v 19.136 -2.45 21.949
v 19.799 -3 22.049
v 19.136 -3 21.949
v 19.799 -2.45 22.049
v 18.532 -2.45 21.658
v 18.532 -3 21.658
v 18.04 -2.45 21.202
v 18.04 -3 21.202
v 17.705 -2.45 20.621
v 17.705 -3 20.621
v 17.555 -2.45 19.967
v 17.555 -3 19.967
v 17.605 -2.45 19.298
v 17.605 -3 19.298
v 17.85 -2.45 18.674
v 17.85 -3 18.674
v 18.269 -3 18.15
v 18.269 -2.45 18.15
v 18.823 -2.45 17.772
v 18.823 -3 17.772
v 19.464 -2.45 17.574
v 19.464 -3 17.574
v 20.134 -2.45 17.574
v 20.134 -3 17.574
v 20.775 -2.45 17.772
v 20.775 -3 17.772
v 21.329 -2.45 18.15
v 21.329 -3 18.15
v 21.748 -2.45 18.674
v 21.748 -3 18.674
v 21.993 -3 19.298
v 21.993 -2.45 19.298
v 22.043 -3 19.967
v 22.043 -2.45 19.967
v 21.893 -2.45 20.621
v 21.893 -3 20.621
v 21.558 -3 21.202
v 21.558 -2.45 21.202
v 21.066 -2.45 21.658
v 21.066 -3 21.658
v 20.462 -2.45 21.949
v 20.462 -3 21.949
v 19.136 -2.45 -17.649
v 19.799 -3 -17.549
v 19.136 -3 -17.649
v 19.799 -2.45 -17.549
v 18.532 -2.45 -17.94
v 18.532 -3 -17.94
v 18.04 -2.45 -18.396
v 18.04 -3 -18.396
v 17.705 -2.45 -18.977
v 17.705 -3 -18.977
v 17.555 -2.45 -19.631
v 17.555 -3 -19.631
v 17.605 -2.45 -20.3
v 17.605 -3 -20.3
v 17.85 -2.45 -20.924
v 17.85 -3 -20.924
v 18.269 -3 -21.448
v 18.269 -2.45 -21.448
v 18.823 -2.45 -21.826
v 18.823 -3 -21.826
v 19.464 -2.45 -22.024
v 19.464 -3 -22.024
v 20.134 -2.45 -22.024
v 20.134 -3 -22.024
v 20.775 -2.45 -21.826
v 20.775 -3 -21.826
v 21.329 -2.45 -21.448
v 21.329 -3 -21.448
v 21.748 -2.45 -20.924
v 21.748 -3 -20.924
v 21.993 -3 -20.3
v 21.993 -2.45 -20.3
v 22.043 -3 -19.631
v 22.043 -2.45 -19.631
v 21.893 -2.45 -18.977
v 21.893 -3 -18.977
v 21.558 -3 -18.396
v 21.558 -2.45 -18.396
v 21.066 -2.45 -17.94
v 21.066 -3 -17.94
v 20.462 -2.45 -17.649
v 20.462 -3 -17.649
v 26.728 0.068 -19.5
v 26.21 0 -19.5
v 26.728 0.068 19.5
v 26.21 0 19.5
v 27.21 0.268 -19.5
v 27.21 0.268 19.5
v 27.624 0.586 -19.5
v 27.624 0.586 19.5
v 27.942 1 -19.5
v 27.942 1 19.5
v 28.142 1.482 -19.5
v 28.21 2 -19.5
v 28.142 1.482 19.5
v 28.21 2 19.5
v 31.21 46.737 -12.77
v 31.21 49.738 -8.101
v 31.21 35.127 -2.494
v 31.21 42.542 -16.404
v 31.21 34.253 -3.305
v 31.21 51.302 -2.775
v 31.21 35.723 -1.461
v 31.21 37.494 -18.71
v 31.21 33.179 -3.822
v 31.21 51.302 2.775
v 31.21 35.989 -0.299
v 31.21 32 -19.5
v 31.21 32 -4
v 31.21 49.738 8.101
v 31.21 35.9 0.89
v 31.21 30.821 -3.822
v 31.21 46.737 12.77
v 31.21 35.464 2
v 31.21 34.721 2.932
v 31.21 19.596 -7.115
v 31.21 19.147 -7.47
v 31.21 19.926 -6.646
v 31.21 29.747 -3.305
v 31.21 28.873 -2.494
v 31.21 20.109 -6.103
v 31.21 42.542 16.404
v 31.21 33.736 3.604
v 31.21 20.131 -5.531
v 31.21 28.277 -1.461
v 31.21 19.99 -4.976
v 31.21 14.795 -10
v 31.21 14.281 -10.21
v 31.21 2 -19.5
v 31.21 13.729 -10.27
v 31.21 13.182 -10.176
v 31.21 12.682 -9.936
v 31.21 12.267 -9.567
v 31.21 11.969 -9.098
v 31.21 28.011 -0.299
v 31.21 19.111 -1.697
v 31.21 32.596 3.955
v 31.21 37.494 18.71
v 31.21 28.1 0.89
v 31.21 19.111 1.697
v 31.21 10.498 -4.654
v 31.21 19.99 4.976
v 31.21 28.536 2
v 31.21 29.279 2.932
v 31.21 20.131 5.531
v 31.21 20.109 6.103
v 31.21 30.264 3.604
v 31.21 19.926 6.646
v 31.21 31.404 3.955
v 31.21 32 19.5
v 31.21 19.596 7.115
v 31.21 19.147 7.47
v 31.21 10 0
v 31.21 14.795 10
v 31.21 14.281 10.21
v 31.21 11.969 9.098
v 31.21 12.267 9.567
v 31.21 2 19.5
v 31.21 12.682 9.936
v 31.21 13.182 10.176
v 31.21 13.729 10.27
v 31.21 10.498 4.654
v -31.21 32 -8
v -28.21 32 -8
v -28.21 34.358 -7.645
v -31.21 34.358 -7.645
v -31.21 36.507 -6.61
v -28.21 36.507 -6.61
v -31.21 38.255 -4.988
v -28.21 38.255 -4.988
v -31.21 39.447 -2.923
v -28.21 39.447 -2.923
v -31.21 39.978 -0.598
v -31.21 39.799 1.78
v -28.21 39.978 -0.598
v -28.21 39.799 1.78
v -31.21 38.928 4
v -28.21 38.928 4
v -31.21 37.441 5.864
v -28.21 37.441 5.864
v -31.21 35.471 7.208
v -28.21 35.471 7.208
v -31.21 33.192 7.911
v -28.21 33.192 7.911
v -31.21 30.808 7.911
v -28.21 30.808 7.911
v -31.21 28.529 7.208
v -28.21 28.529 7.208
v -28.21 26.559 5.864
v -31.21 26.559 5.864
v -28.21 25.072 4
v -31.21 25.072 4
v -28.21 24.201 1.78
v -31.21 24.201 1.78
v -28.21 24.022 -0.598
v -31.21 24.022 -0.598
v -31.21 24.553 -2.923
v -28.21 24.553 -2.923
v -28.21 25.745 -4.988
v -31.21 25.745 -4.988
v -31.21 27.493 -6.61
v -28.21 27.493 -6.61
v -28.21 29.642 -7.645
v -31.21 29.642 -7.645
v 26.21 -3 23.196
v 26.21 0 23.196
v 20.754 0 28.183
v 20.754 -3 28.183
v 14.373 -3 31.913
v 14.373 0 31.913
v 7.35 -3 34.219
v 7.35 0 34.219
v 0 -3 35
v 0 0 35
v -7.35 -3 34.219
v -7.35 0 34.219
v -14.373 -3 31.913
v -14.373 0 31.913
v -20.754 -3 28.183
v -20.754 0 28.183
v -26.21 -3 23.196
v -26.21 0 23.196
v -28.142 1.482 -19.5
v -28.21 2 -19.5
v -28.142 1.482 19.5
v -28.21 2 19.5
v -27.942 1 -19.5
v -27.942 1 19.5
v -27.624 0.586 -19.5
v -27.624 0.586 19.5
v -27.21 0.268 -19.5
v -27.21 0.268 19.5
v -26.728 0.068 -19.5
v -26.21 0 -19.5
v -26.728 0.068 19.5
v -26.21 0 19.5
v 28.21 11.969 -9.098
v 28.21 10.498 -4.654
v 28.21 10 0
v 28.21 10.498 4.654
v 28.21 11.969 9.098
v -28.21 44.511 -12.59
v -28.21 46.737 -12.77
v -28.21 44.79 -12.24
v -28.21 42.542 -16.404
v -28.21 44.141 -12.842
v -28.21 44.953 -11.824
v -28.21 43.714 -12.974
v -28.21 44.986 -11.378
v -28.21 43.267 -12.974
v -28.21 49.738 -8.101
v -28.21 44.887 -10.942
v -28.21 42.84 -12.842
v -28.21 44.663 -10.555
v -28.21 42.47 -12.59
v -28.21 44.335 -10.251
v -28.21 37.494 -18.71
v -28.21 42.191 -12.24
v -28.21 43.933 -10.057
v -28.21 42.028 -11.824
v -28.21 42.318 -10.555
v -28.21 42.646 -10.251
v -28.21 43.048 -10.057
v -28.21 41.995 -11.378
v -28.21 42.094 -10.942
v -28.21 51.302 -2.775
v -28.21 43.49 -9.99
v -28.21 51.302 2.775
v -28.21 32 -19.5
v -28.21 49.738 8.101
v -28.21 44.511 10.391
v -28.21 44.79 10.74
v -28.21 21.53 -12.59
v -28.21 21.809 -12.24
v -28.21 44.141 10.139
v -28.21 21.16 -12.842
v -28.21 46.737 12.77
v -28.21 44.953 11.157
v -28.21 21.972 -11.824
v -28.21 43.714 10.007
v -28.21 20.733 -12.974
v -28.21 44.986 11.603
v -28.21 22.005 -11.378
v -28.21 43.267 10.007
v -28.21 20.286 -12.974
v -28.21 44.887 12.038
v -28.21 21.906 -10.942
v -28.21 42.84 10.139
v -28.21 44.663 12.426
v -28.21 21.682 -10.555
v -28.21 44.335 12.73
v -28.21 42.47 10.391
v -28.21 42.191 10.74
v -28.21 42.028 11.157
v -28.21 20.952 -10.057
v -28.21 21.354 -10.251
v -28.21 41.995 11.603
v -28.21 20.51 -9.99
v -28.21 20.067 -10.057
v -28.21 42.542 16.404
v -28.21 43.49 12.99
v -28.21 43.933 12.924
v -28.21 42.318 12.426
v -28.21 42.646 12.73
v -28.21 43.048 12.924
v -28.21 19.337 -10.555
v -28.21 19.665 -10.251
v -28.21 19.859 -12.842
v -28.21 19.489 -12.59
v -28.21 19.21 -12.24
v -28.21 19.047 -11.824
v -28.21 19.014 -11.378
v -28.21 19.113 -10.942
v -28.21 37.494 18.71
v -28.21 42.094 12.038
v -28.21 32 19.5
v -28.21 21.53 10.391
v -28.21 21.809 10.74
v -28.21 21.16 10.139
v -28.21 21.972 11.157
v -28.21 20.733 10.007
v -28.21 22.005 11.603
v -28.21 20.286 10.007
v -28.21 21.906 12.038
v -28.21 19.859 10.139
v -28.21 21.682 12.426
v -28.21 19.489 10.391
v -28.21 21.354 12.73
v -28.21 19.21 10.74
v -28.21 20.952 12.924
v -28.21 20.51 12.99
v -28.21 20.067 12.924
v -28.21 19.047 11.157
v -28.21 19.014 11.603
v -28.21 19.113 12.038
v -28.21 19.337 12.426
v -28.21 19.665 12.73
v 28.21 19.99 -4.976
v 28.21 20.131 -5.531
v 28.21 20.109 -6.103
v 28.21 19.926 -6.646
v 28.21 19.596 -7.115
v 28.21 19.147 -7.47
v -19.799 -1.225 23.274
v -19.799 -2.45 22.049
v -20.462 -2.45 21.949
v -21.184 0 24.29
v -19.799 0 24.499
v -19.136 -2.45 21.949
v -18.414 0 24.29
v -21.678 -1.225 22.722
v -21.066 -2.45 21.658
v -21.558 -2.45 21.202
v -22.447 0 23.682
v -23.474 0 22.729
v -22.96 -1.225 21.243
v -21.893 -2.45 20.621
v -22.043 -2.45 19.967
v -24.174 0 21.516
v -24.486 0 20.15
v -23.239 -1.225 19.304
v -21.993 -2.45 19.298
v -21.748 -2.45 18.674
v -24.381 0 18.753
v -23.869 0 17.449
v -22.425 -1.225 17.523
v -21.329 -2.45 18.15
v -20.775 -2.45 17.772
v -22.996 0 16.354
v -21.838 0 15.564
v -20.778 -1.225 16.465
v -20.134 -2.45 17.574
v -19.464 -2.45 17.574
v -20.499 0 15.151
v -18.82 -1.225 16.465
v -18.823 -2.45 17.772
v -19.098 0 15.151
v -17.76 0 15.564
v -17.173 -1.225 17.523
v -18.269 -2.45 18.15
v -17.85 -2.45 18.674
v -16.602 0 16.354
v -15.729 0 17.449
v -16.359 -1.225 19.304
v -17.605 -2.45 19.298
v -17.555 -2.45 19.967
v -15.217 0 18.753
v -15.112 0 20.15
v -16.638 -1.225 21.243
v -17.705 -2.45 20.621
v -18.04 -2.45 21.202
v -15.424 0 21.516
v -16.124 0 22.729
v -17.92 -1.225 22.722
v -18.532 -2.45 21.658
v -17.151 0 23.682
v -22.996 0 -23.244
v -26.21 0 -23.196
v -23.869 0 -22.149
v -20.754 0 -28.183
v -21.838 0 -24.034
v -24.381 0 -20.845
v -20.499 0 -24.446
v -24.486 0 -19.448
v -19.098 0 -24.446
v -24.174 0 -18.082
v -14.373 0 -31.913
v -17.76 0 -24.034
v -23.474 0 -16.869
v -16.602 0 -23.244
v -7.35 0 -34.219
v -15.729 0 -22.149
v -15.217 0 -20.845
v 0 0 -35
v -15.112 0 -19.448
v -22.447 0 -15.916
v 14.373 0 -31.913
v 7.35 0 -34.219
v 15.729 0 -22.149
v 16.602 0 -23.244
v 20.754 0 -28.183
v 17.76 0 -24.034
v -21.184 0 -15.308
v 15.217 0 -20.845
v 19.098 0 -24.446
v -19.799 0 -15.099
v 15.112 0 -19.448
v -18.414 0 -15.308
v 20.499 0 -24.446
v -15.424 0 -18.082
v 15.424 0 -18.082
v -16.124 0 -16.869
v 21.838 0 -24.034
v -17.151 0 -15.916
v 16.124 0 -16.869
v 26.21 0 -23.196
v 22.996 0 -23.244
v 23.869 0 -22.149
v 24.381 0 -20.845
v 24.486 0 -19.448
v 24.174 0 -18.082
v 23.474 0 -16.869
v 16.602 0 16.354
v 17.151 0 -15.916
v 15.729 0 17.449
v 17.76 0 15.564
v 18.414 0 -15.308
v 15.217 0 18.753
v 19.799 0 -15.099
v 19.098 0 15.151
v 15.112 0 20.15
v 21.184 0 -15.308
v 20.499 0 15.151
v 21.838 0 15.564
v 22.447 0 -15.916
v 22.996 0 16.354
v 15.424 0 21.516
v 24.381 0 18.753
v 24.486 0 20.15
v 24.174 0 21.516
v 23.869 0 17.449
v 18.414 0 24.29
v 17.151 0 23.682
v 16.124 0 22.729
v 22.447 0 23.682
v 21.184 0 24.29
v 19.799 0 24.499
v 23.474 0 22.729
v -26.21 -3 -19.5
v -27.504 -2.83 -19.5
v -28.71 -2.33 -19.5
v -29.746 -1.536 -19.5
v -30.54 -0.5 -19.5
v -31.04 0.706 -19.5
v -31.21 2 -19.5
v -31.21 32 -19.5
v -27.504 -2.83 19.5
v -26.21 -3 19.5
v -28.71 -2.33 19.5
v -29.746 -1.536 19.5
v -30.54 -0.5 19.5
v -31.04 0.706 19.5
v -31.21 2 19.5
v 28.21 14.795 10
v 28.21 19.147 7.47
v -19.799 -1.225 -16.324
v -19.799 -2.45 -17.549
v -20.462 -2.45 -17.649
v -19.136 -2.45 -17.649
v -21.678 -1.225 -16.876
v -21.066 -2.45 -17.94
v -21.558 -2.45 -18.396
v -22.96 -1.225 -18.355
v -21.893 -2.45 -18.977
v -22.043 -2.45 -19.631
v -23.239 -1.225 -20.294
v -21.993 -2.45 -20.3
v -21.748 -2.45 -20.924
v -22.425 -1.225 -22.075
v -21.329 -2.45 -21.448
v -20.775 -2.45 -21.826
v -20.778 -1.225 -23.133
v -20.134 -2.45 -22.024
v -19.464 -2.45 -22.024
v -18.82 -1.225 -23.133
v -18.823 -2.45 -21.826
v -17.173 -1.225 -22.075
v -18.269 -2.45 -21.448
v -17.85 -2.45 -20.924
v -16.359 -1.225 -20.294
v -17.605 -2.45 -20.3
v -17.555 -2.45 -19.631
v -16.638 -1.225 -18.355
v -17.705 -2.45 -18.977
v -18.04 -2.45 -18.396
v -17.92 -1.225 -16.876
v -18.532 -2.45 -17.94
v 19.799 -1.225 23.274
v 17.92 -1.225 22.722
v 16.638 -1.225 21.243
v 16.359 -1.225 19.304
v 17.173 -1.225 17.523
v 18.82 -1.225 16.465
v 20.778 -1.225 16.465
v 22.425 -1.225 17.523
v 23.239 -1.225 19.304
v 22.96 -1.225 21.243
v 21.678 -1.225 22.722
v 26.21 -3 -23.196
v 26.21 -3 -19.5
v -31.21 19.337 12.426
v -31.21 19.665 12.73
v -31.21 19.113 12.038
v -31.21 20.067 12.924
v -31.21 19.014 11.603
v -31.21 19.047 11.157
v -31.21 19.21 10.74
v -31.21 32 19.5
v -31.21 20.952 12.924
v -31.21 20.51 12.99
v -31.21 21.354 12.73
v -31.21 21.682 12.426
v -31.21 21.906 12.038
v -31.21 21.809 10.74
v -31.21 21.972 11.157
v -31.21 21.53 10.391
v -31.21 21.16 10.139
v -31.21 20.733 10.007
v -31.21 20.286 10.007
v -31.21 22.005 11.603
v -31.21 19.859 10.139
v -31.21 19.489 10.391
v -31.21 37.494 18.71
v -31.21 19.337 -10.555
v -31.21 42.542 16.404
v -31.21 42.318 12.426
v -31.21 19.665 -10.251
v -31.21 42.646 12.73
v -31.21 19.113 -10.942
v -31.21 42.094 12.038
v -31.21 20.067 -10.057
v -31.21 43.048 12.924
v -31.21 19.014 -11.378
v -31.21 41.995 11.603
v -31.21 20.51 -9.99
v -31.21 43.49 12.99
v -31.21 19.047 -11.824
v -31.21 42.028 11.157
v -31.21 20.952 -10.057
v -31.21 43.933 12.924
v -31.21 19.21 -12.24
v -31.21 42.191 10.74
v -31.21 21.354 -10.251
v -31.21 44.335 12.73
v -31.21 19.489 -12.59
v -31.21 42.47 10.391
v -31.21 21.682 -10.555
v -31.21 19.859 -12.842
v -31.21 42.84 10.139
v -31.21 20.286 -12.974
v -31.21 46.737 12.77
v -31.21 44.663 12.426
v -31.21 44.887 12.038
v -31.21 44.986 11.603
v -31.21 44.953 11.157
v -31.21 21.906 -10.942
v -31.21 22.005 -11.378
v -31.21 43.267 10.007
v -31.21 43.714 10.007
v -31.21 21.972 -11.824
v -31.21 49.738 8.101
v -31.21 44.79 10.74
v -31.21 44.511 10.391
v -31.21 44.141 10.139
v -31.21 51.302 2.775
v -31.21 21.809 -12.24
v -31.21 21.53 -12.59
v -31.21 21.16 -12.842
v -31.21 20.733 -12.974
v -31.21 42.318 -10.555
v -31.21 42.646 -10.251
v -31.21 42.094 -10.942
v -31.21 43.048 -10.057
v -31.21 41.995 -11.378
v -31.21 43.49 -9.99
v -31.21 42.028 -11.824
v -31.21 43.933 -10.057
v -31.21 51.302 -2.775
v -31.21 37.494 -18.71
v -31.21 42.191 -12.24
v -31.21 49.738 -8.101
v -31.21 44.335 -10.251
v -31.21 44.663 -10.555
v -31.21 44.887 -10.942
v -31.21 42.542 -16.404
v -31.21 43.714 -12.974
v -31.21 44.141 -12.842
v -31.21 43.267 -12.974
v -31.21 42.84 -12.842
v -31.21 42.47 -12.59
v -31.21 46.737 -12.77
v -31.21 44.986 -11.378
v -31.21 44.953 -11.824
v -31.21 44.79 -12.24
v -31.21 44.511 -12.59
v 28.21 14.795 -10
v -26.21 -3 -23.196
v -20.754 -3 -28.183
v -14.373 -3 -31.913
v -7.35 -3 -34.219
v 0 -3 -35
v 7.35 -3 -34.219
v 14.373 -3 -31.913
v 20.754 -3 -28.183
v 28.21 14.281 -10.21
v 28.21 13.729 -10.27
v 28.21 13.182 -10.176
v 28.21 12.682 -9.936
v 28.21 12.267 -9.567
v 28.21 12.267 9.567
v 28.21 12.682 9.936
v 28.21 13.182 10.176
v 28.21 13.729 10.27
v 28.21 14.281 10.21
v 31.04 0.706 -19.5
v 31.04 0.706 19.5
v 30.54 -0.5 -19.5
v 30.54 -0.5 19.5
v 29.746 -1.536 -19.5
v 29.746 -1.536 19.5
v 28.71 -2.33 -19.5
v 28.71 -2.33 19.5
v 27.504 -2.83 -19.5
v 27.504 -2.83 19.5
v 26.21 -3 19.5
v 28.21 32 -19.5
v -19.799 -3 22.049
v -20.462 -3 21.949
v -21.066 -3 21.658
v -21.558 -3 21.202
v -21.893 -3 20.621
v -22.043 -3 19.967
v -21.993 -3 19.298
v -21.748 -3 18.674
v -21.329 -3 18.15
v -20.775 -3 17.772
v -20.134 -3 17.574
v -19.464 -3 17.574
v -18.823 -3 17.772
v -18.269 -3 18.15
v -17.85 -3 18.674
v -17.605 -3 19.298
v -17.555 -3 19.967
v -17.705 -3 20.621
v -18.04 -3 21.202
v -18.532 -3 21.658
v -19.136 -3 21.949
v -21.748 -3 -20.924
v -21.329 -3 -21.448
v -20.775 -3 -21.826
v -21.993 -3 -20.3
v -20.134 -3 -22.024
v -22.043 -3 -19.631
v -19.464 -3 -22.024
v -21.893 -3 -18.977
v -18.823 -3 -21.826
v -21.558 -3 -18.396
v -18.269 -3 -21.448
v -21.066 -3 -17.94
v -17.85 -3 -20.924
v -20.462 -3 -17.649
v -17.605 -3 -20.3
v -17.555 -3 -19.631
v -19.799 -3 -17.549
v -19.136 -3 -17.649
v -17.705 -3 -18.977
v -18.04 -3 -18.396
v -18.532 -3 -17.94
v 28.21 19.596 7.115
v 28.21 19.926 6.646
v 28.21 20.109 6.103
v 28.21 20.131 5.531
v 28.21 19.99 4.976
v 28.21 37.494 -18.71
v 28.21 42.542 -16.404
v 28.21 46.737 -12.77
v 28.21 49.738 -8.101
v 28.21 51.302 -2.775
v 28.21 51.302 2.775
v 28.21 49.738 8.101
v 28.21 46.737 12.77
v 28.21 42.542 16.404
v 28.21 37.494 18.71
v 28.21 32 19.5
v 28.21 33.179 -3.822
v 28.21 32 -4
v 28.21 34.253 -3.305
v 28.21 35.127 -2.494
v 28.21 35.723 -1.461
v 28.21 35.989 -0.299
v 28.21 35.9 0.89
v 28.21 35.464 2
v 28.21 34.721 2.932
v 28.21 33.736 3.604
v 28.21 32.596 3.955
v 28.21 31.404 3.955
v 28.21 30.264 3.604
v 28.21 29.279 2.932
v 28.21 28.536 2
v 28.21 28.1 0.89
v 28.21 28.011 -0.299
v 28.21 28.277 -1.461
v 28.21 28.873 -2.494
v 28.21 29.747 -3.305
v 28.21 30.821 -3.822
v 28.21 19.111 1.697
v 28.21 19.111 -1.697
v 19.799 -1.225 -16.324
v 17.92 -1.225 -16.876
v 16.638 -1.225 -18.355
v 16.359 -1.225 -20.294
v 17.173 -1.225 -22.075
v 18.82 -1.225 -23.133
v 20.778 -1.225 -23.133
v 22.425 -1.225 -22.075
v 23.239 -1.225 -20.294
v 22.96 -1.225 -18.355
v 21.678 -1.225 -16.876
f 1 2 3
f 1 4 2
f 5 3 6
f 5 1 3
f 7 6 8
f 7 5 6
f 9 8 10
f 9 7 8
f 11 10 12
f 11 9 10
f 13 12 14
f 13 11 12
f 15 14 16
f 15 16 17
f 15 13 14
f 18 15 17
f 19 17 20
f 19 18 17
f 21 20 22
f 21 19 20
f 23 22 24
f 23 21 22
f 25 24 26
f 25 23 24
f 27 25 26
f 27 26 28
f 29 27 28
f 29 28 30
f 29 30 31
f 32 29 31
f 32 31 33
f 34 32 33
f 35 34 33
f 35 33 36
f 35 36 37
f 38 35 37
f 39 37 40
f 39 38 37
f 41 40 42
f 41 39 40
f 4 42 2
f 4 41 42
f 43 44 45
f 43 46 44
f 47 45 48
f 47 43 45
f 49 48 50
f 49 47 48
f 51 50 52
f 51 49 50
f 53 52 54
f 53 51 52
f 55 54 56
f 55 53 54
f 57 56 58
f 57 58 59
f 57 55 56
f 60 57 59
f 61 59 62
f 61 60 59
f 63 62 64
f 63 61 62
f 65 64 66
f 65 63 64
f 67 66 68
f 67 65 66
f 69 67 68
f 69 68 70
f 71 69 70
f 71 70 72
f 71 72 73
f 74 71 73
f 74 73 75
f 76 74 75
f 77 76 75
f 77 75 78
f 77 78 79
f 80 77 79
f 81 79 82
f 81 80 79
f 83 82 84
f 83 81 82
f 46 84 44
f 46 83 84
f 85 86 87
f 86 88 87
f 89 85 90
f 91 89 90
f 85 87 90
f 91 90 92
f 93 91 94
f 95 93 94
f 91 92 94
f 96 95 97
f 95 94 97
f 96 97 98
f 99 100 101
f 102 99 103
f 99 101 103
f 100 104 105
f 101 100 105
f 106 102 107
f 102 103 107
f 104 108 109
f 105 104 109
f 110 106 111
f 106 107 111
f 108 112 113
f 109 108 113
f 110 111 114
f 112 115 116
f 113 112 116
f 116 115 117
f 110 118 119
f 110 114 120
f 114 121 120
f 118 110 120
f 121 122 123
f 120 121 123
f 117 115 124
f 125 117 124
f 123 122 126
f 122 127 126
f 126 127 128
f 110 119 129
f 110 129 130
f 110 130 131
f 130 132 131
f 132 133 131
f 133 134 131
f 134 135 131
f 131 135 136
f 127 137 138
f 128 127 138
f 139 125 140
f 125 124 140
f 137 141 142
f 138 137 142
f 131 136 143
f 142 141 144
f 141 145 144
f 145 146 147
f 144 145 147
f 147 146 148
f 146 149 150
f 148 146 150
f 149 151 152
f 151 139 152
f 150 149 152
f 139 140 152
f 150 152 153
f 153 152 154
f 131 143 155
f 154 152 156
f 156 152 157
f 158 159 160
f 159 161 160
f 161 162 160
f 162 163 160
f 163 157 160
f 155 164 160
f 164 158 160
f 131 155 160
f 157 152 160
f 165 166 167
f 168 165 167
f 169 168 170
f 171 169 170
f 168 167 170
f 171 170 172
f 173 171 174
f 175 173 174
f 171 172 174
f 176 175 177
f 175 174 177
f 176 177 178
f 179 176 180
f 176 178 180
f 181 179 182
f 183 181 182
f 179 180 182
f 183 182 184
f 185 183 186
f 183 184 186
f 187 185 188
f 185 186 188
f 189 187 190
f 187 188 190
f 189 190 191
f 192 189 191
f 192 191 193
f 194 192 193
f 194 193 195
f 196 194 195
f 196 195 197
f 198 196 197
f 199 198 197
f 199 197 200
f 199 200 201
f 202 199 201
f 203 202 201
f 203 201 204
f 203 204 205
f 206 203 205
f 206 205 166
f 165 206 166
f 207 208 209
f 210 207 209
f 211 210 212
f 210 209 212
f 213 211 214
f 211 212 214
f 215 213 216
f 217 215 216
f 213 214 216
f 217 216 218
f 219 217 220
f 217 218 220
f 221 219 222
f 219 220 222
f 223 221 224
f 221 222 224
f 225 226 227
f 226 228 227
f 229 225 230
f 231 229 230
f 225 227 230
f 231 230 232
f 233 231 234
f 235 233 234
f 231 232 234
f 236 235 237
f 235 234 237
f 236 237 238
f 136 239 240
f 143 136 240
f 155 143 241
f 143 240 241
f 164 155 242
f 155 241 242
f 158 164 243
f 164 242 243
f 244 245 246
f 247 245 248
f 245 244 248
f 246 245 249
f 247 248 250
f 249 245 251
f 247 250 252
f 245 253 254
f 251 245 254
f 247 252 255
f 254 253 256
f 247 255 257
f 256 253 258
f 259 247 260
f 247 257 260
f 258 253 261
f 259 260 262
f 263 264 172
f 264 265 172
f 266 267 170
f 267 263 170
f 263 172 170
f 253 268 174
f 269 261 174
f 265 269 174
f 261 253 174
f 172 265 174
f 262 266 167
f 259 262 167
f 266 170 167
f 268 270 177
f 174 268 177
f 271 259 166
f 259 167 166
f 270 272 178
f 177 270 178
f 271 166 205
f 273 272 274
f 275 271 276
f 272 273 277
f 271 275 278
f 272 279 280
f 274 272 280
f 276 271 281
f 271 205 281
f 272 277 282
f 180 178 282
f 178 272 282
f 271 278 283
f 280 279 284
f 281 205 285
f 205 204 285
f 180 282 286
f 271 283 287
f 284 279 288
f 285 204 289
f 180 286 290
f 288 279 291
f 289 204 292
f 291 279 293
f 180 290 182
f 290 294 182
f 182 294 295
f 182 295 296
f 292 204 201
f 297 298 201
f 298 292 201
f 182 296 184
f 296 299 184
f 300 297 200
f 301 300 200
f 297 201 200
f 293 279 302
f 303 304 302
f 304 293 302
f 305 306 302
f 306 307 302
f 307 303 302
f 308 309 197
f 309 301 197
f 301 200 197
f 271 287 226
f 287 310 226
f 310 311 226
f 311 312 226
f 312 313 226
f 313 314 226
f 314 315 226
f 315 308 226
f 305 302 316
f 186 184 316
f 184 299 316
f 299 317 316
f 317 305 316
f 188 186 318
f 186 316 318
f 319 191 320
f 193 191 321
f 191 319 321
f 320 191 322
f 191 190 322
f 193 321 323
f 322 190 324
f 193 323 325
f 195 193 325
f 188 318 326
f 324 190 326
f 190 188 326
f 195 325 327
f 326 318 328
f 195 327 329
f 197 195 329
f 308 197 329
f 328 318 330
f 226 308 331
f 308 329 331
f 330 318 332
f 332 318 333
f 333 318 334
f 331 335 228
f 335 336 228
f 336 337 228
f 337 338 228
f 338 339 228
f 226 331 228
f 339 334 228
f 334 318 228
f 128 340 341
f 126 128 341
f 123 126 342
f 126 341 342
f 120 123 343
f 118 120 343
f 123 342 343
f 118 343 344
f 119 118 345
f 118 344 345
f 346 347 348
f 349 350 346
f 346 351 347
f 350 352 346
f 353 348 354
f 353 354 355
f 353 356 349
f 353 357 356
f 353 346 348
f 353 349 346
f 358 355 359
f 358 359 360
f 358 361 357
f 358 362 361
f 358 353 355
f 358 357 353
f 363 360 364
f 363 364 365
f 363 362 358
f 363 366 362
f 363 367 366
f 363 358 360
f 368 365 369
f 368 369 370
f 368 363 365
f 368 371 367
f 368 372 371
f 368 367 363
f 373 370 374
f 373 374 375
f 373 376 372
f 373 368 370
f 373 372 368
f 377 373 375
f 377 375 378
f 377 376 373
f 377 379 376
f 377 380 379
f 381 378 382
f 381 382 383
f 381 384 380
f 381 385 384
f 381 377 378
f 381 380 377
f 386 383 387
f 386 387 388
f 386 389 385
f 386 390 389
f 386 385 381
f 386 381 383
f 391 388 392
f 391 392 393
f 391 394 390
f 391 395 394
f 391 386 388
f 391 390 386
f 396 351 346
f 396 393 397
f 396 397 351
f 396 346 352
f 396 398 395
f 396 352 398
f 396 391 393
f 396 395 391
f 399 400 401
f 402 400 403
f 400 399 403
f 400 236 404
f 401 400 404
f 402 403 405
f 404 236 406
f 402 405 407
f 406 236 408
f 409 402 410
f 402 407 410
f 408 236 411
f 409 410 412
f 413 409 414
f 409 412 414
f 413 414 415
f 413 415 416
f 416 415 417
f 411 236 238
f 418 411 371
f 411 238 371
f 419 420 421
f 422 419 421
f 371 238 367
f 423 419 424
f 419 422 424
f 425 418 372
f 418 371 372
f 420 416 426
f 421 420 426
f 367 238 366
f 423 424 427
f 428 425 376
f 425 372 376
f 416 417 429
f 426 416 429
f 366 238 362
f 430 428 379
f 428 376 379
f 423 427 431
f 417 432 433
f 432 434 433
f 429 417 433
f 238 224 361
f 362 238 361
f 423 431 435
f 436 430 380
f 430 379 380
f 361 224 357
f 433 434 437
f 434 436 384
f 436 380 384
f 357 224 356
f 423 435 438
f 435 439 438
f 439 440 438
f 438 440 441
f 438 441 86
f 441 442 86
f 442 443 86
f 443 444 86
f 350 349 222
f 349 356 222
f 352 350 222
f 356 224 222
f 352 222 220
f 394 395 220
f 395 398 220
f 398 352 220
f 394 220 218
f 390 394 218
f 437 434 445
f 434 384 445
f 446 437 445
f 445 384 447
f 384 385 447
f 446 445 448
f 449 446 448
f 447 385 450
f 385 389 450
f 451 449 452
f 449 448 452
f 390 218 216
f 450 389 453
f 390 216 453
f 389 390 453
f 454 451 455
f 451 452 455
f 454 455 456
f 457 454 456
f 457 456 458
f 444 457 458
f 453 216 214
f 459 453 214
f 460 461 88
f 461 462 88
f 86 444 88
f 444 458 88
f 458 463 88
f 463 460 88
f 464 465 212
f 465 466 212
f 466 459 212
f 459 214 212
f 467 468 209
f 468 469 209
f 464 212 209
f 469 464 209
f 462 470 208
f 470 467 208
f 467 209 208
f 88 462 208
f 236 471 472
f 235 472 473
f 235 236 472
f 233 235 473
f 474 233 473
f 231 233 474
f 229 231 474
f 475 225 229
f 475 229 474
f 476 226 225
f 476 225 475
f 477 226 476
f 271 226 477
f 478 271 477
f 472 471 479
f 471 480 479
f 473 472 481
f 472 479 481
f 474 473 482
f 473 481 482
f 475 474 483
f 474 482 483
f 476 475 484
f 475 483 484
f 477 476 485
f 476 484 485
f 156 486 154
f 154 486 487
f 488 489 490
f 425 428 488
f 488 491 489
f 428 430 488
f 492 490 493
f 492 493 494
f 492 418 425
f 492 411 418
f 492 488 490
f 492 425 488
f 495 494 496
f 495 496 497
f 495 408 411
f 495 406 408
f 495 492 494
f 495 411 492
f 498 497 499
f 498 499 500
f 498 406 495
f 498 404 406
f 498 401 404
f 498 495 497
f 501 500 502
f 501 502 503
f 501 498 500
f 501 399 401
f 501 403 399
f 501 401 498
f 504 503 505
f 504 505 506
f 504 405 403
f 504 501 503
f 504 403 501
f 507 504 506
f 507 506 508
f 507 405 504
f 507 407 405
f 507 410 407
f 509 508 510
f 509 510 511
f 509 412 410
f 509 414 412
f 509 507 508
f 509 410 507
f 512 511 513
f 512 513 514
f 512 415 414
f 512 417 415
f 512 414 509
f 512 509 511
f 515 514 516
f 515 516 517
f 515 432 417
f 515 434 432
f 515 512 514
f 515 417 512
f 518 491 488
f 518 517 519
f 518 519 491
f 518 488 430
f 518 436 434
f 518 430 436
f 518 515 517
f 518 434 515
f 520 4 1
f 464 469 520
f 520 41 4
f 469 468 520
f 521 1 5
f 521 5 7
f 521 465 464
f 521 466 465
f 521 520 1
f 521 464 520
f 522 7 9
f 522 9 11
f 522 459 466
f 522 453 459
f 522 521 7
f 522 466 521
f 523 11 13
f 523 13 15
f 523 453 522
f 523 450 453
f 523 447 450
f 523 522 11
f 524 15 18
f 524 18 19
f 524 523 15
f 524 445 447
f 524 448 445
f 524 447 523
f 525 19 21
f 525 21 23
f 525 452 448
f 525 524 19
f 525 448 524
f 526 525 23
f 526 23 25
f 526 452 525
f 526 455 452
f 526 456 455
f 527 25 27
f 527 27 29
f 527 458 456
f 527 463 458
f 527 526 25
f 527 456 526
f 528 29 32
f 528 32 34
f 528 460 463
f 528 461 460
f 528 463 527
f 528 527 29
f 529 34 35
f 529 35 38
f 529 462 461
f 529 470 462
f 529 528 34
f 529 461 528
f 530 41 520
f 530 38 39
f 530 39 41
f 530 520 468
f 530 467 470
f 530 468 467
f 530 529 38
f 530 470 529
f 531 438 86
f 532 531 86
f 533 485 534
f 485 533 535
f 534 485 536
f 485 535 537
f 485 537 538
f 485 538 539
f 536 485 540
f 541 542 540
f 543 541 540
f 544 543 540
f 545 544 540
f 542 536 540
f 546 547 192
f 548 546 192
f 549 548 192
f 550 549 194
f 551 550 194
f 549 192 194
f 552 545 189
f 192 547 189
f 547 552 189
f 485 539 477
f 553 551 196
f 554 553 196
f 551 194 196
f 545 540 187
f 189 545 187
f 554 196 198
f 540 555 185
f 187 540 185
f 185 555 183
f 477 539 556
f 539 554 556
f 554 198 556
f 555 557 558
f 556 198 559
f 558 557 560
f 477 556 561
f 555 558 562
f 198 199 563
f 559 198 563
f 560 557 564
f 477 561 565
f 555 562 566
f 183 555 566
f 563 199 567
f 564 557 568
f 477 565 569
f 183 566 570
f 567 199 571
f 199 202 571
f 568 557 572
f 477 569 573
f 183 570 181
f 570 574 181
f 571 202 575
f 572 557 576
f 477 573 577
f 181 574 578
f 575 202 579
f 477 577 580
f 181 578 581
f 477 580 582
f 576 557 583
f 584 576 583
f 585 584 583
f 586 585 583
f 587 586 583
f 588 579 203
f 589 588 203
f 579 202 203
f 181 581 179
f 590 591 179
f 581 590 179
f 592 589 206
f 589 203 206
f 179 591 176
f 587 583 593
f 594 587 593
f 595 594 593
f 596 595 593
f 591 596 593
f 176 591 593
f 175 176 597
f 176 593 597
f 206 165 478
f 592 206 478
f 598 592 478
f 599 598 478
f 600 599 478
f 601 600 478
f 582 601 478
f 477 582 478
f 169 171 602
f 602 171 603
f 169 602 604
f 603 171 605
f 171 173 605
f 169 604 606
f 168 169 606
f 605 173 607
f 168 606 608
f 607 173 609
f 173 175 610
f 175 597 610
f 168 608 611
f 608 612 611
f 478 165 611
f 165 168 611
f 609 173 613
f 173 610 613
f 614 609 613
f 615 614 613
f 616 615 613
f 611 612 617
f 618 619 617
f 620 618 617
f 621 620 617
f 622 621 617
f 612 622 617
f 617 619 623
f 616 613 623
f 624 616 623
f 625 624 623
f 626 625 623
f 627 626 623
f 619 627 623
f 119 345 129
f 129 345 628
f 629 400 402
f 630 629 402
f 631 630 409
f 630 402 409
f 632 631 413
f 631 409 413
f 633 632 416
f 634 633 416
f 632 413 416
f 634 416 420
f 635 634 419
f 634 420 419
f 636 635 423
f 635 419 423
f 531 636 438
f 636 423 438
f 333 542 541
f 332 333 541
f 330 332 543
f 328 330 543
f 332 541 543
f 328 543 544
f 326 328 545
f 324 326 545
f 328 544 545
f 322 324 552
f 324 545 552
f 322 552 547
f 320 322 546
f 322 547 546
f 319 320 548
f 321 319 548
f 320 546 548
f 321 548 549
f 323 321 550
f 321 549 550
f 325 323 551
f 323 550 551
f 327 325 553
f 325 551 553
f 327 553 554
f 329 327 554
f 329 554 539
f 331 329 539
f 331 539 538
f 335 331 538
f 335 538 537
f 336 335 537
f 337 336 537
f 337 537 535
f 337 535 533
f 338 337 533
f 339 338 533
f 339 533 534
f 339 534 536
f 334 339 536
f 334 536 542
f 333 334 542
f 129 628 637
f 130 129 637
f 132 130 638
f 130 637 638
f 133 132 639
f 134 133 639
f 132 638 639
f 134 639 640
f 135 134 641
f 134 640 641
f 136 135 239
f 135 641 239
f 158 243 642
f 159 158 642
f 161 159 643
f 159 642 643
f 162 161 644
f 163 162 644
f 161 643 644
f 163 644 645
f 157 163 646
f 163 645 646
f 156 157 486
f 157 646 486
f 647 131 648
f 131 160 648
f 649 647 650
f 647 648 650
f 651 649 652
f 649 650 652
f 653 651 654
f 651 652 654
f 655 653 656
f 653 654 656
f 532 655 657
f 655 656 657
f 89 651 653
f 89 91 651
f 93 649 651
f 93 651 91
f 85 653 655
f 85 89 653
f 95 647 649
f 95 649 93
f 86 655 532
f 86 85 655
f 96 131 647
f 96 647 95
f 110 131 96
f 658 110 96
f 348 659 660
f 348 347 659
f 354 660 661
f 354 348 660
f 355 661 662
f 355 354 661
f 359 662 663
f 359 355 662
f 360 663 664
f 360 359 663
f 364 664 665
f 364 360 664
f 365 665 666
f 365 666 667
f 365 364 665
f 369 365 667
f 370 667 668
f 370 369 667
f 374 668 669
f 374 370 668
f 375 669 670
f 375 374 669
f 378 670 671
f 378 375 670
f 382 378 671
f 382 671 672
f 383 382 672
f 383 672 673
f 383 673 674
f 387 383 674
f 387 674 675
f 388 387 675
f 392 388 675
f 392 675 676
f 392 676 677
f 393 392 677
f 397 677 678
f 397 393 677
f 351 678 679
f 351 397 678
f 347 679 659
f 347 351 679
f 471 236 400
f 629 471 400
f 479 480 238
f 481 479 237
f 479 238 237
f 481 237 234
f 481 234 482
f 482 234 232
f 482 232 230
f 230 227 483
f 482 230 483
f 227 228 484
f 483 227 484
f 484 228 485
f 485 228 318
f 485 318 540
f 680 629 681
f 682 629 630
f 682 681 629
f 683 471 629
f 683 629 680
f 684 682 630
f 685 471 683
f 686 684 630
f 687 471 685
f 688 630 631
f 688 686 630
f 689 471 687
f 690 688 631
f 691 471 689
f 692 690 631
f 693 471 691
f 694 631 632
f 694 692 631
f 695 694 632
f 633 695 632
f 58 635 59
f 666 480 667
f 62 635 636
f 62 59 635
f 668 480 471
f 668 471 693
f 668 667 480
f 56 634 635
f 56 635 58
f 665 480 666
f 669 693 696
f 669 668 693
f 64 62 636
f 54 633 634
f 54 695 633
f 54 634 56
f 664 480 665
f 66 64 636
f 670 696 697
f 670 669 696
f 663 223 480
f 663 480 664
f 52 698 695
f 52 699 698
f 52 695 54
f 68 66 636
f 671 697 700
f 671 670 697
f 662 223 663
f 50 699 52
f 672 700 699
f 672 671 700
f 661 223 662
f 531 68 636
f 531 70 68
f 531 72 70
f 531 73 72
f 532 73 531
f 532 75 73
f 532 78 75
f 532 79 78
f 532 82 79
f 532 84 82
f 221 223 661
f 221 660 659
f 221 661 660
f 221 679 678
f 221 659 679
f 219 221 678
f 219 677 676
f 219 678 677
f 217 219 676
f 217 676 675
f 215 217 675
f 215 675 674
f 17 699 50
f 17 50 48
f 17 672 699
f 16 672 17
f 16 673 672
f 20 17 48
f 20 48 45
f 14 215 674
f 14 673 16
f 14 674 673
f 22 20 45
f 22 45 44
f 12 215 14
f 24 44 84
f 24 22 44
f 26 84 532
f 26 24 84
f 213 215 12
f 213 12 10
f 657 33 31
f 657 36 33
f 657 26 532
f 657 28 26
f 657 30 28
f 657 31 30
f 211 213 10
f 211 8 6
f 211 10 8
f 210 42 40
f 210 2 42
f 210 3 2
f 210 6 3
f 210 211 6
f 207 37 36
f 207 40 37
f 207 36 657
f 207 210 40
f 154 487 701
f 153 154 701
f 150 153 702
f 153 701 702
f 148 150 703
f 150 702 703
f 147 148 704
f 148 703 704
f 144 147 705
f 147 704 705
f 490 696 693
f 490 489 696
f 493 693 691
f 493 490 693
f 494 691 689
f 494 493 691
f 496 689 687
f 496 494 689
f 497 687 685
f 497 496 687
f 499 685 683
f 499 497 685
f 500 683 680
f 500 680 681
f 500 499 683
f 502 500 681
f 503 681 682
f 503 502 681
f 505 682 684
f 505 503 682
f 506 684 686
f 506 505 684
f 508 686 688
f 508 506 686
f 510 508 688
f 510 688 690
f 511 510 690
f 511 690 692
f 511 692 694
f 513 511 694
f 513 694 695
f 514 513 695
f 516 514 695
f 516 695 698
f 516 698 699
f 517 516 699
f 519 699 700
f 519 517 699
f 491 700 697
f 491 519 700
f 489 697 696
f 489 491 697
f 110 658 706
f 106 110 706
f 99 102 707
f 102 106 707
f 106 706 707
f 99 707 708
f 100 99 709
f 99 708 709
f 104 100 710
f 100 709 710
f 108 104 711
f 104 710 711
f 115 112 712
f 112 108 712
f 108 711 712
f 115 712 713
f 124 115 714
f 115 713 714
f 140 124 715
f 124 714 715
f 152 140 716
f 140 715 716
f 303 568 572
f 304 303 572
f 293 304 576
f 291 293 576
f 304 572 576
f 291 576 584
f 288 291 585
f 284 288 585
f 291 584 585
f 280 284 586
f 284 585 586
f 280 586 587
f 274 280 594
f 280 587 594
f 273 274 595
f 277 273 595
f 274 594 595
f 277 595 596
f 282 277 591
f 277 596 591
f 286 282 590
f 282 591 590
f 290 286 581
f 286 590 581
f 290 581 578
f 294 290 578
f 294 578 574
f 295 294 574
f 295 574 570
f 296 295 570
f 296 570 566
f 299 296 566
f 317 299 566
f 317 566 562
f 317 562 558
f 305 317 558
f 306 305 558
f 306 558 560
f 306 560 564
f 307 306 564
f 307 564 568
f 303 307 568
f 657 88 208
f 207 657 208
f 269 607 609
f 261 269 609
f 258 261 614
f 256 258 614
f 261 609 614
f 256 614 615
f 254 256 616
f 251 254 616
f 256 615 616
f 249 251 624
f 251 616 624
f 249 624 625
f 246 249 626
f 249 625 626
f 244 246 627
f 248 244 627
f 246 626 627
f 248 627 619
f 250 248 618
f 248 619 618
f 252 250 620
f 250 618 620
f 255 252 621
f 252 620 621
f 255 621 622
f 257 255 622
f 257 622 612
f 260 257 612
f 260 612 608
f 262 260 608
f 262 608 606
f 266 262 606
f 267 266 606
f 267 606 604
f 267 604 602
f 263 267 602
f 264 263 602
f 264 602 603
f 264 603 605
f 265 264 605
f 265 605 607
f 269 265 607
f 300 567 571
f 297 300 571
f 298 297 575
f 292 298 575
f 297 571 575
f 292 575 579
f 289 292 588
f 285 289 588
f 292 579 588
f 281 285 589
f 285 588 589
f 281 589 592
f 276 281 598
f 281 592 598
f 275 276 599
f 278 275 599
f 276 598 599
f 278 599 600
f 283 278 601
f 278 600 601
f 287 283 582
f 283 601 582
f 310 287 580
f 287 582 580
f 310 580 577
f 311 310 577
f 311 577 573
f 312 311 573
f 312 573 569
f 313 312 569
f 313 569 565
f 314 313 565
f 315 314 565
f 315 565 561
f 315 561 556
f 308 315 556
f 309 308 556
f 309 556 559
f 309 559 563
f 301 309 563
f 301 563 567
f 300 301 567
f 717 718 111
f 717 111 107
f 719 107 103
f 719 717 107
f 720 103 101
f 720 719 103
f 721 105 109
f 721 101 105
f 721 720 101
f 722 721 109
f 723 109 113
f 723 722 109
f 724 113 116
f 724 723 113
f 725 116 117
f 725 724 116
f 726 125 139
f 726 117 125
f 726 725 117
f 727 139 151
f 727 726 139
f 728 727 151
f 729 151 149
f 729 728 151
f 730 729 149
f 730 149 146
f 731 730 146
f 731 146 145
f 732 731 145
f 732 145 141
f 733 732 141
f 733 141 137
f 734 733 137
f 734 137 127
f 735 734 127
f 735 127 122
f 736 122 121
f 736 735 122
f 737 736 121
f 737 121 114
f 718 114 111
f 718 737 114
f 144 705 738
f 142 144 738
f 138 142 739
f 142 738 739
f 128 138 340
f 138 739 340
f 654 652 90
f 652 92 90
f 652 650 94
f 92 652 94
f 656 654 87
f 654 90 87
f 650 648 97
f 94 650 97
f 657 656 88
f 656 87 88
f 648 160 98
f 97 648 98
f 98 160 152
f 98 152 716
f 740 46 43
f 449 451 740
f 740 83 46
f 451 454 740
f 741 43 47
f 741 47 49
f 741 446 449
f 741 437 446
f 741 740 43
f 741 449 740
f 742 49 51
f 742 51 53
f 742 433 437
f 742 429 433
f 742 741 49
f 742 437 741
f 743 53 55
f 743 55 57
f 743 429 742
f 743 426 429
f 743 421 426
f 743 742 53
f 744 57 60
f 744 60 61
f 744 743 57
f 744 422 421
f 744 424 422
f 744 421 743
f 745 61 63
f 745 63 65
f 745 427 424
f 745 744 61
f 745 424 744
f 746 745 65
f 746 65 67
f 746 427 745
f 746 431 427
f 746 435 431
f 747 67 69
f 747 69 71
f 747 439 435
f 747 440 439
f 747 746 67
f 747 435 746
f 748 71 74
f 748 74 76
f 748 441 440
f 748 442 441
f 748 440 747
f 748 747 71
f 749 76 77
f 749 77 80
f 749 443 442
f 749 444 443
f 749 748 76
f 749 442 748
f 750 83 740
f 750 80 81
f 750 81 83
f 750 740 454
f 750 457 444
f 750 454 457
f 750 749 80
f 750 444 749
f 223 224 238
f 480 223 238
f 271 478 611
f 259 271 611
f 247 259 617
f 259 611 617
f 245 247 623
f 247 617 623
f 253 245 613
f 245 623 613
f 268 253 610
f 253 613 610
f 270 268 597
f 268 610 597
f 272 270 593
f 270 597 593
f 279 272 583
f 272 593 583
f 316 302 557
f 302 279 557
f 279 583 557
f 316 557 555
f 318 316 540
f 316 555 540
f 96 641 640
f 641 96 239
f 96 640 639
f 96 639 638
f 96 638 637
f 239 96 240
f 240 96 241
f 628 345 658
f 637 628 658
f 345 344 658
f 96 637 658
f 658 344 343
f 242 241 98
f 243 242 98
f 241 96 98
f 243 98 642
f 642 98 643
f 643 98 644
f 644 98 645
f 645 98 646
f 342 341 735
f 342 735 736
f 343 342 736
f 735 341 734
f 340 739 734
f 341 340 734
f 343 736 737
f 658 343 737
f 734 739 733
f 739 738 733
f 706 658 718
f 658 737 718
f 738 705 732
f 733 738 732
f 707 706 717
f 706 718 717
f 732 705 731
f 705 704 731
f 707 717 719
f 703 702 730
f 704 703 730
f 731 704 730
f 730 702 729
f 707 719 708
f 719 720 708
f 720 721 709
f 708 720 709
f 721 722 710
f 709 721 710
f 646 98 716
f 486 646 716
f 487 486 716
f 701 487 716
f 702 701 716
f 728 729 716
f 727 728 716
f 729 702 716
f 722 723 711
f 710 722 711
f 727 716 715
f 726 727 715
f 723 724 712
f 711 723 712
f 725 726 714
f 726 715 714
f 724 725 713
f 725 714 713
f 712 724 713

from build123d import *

# Parameters (mm, degrees)
BASE_FLANGE1_DEPTH                           = 19.5
SKETCH13_R                                   = 4
CUT_EXTRUDE6_DEPTH                           = 84.228219974
CUT_EXTRUDE7_DEPTH                           = 84.228219974
CUT_EXTRUDE7_DEPTH_BACK                      = 84.228219974
SKETCH33_R                                   = 8
CUT_EXTRUDE10_DEPTH                          = 10
SKETCH34_R                                   = 1.5
CUT_EXTRUDE11_DEPTH                          = 10
BOSS_EXTRUDE1_DEPTH                          = 3
TAB1_START                                   = -3
TAB1_DEPTH                                   = 3
CSK_FOR_M4_COUNTERSUNK_FLAT_HEAD_SCR_2_COUNT = 2
CSK_FOR_M4_COUNTERSUNK_FLAT_HEAD_SCR_2_PITCH = 39.597979746
CSK_FOR_M4_COUNTERSUNK_FLAT_HEAD_SCR_3_COUNT = 2
CSK_FOR_M4_COUNTERSUNK_FLAT_HEAD_SCR_3_PITCH = 56
CSK_FOR_M4_COUNTERSUNK_FLAT_HEAD_SCR_4_COUNT = 2
CSK_FOR_M4_COUNTERSUNK_FLAT_HEAD_SCR_4_PITCH = 39.597979746


# Read off the part's stored shape, not the designer's step: Tab1
# Sheet-metal steps are written as plain solids
with BuildPart() as part:
    # Sketch1 → Base-Flange1 (new, symmetric)
    with BuildSketch(Plane.XY):
        with BuildLine():
            Line((-28.21, 74.65), (-28.21, 2))
            ThreePointArc((-28.21, 2), (-27.624213562, 0.585786438), (-26.21, 0))
            Line((-26.21, 0), (26.21, 0))
            ThreePointArc((26.21, 0), (27.624213562, 0.585786438), (28.21, 2))
            Line((28.21, 2), (28.21, 74.65))
            Line((28.21, 74.65), (31.21, 74.65))
            Line((31.21, 74.65), (31.21, 2))
            ThreePointArc((31.21, 2), (29.745533906, -1.535533906), (26.21, -3))
            Line((26.21, -3), (-26.21, -3))
            ThreePointArc((-26.21, -3), (-29.745533906, -1.535533906), (-31.21, 2))
            Line((-31.21, 2), (-31.21, 74.65))
            Line((-31.21, 74.65), (-28.21, 74.65))
        make_face()
    extrude(amount=BASE_FLANGE1_DEPTH, both=True)

    # Sketch13 → Cut-Extrude6 (cut, through all)
    with BuildSketch(Plane(origin=(0, 0, 0), x_dir=(0, 0, -1), z_dir=(1, 0, 0))):
        with Locations((0, 32)):
            Circle(SKETCH13_R)
    extrude(amount=CUT_EXTRUDE6_DEPTH, mode=Mode.SUBTRACT)

    # Sketch15 → Cut-Extrude7 (cut, two sides: drawn at the far end of the back side and taken through both)
    with BuildSketch(Plane(origin=(0, 0, 0), x_dir=(0, 0, -1), z_dir=(1, 0, 0)).offset(-CUT_EXTRUDE7_DEPTH_BACK)):
        with BuildLine():
            Line((-19.5, 32), (-26.744382408, 32))
            Line((-26.744382408, 32), (-26.744382408, 87.632847334))
            Line((-26.744382408, 87.632847334), (26.744382408, 87.632847334))
            Line((26.744382408, 87.632847334), (26.744382408, 32))
            Line((26.744382408, 32), (19.5, 32))
            ThreePointArc((19.5, 32), (0, 51.5), (-19.5, 32))
        make_face()
        with BuildLine():
            Line((7.470480628, 19.147299148), (10, 14.795349466))
            ThreePointArc((10, 14.795349466), (10.176160856, 13.182152576), (9.097954318, 11.969342816))
            ThreePointArc((9.097954318, 11.969342816), (0, 10), (-9.097954318, 11.969342816))
            ThreePointArc((-9.097954318, 11.969342816), (-10.176160856, 13.182152576), (-10, 14.795349466))
            Line((-10, 14.795349466), (-7.470480628, 19.147299148))
            ThreePointArc((-7.470480628, 19.147299148), (-6.381394917, 20.037080634), (-4.975835097, 19.989959822))
            ThreePointArc((-4.975835097, 19.989959822), (0, 19), (4.975835097, 19.989959822))
            ThreePointArc((4.975835097, 19.989959822), (6.381394917, 20.037080634), (7.470480628, 19.147299148))
        make_face()
    extrude(amount=CUT_EXTRUDE7_DEPTH + CUT_EXTRUDE7_DEPTH_BACK, mode=Mode.SUBTRACT)

    # Sketch33 → Cut-Extrude10 (cut)
    with BuildSketch(Plane(origin=(-28.21, 0, 0), x_dir=(0, 0, -1), z_dir=(1, 0, 0))):
        with Locations((0, 32)):
            Circle(SKETCH33_R)
    extrude(amount=-CUT_EXTRUDE10_DEPTH, mode=Mode.SUBTRACT)

    # Sketch34 → Cut-Extrude11 (cut)
    with BuildSketch(Plane.ZY.offset(31.21)):
        with Locations((-11.490485194, 43.490485194)):
            Circle(SKETCH34_R)
        with Locations((11.490485194, 43.490485194)):
            Circle(SKETCH34_R)
        with Locations((11.490485194, 20.509514806)):
            Circle(SKETCH34_R)
        with Locations((-11.490485194, 20.509514806)):
            Circle(SKETCH34_R)
    extrude(amount=-CUT_EXTRUDE11_DEPTH, mode=Mode.SUBTRACT)

    # Sketch37 → Boss-Extrude1 (add)
    with BuildSketch(Plane.ZY.offset(31.21)):
        with BuildLine():
            Line((7.470480628, 19.147299148), (10, 14.795349466))
            ThreePointArc((10, 14.795349466), (10.176160856, 13.182152576), (9.097954318, 11.969342816))
            ThreePointArc((9.097954318, 11.969342816), (0, 10), (-9.097954318, 11.969342816))
            ThreePointArc((-9.097954318, 11.969342816), (-10.176160856, 13.182152576), (-10, 14.795349466))
            Line((-10, 14.795349466), (-7.470480628, 19.147299148))
            ThreePointArc((-7.470480628, 19.147299148), (-6.381394917, 20.037080634), (-4.975835097, 19.989959822))
            ThreePointArc((-4.975835097, 19.989959822), (0, 19), (4.975835097, 19.989959822))
            ThreePointArc((4.975835097, 19.989959822), (6.381394917, 20.037080634), (7.470480628, 19.147299148))
        make_face()
    extrude(amount=-BOSS_EXTRUDE1_DEPTH)

    # Tab1 outline → Tab1 (add)
    with BuildSketch(Plane.XZ.offset(3).offset(TAB1_START)):
        with BuildLine():
            Line((26.21, 19.5), (26.21, 23.195600876))
            ThreePointArc((26.21, 23.195600876), (0, 35), (-26.21, 23.195600876))
            Line((-26.21, 23.195600876), (-26.21, 19.5))
            Line((-26.21, 19.5), (26.21, 19.5))
        make_face()
        with BuildLine():
            Line((-26.21, -19.5), (-26.21, -23.195600876))
            ThreePointArc((-26.21, -23.195600876), (0, -35), (26.21, -23.195600876))
            Line((26.21, -23.195600876), (26.21, -19.5))
            Line((26.21, -19.5), (-26.21, -19.5))
        make_face()
    extrude(amount=TAB1_DEPTH)

    # Sketch42 → CSK for M4 Countersunk Flat Head Screw1 (revolve, cut)
    with BuildSketch(Plane(origin=(19.798989873, 0, -19.798989873), x_dir=(0, 0, 1), z_dir=(1, 0, 0))):
        Polygon((0, 0), (0, 3), (2.25, 3), (2.25, 2.45), (4.7, 0), align=None)
    csk_for_m4_countersunk_flat_head_screw1 = revolve(axis=Axis((19.798989873, 6.35, -19.798989873), (0, -1, 0)), mode=Mode.SUBTRACT)

    # CSK for M4 Countersunk Flat Head Scr 2: CSK for M4 Countersunk Flat Head Screw1 ×2
    with Locations(*[(-i * CSK_FOR_M4_COUNTERSUNK_FLAT_HEAD_SCR_2_PITCH, 0, 0) for i in range(1, CSK_FOR_M4_COUNTERSUNK_FLAT_HEAD_SCR_2_COUNT)]):
        add(csk_for_m4_countersunk_flat_head_screw1, mode=Mode.SUBTRACT)

    # CSK for M4 Countersunk Flat Head Scr 3: CSK for M4 Countersunk Flat Head Screw1 ×2
    with Locations(*[Vector(-0.7071067811865476, 0, 0.7071067811865476) * (i * CSK_FOR_M4_COUNTERSUNK_FLAT_HEAD_SCR_3_PITCH) for i in range(1, CSK_FOR_M4_COUNTERSUNK_FLAT_HEAD_SCR_3_COUNT)]):
        add(csk_for_m4_countersunk_flat_head_screw1, mode=Mode.SUBTRACT)

    # CSK for M4 Countersunk Flat Head Scr 4: CSK for M4 Countersunk Flat Head Screw1 ×2
    with Locations(*[(0, 0, i * CSK_FOR_M4_COUNTERSUNK_FLAT_HEAD_SCR_4_PITCH) for i in range(1, CSK_FOR_M4_COUNTERSUNK_FLAT_HEAD_SCR_4_COUNT)]):
        add(csk_for_m4_countersunk_flat_head_screw1, mode=Mode.SUBTRACT)


solid = part.part
